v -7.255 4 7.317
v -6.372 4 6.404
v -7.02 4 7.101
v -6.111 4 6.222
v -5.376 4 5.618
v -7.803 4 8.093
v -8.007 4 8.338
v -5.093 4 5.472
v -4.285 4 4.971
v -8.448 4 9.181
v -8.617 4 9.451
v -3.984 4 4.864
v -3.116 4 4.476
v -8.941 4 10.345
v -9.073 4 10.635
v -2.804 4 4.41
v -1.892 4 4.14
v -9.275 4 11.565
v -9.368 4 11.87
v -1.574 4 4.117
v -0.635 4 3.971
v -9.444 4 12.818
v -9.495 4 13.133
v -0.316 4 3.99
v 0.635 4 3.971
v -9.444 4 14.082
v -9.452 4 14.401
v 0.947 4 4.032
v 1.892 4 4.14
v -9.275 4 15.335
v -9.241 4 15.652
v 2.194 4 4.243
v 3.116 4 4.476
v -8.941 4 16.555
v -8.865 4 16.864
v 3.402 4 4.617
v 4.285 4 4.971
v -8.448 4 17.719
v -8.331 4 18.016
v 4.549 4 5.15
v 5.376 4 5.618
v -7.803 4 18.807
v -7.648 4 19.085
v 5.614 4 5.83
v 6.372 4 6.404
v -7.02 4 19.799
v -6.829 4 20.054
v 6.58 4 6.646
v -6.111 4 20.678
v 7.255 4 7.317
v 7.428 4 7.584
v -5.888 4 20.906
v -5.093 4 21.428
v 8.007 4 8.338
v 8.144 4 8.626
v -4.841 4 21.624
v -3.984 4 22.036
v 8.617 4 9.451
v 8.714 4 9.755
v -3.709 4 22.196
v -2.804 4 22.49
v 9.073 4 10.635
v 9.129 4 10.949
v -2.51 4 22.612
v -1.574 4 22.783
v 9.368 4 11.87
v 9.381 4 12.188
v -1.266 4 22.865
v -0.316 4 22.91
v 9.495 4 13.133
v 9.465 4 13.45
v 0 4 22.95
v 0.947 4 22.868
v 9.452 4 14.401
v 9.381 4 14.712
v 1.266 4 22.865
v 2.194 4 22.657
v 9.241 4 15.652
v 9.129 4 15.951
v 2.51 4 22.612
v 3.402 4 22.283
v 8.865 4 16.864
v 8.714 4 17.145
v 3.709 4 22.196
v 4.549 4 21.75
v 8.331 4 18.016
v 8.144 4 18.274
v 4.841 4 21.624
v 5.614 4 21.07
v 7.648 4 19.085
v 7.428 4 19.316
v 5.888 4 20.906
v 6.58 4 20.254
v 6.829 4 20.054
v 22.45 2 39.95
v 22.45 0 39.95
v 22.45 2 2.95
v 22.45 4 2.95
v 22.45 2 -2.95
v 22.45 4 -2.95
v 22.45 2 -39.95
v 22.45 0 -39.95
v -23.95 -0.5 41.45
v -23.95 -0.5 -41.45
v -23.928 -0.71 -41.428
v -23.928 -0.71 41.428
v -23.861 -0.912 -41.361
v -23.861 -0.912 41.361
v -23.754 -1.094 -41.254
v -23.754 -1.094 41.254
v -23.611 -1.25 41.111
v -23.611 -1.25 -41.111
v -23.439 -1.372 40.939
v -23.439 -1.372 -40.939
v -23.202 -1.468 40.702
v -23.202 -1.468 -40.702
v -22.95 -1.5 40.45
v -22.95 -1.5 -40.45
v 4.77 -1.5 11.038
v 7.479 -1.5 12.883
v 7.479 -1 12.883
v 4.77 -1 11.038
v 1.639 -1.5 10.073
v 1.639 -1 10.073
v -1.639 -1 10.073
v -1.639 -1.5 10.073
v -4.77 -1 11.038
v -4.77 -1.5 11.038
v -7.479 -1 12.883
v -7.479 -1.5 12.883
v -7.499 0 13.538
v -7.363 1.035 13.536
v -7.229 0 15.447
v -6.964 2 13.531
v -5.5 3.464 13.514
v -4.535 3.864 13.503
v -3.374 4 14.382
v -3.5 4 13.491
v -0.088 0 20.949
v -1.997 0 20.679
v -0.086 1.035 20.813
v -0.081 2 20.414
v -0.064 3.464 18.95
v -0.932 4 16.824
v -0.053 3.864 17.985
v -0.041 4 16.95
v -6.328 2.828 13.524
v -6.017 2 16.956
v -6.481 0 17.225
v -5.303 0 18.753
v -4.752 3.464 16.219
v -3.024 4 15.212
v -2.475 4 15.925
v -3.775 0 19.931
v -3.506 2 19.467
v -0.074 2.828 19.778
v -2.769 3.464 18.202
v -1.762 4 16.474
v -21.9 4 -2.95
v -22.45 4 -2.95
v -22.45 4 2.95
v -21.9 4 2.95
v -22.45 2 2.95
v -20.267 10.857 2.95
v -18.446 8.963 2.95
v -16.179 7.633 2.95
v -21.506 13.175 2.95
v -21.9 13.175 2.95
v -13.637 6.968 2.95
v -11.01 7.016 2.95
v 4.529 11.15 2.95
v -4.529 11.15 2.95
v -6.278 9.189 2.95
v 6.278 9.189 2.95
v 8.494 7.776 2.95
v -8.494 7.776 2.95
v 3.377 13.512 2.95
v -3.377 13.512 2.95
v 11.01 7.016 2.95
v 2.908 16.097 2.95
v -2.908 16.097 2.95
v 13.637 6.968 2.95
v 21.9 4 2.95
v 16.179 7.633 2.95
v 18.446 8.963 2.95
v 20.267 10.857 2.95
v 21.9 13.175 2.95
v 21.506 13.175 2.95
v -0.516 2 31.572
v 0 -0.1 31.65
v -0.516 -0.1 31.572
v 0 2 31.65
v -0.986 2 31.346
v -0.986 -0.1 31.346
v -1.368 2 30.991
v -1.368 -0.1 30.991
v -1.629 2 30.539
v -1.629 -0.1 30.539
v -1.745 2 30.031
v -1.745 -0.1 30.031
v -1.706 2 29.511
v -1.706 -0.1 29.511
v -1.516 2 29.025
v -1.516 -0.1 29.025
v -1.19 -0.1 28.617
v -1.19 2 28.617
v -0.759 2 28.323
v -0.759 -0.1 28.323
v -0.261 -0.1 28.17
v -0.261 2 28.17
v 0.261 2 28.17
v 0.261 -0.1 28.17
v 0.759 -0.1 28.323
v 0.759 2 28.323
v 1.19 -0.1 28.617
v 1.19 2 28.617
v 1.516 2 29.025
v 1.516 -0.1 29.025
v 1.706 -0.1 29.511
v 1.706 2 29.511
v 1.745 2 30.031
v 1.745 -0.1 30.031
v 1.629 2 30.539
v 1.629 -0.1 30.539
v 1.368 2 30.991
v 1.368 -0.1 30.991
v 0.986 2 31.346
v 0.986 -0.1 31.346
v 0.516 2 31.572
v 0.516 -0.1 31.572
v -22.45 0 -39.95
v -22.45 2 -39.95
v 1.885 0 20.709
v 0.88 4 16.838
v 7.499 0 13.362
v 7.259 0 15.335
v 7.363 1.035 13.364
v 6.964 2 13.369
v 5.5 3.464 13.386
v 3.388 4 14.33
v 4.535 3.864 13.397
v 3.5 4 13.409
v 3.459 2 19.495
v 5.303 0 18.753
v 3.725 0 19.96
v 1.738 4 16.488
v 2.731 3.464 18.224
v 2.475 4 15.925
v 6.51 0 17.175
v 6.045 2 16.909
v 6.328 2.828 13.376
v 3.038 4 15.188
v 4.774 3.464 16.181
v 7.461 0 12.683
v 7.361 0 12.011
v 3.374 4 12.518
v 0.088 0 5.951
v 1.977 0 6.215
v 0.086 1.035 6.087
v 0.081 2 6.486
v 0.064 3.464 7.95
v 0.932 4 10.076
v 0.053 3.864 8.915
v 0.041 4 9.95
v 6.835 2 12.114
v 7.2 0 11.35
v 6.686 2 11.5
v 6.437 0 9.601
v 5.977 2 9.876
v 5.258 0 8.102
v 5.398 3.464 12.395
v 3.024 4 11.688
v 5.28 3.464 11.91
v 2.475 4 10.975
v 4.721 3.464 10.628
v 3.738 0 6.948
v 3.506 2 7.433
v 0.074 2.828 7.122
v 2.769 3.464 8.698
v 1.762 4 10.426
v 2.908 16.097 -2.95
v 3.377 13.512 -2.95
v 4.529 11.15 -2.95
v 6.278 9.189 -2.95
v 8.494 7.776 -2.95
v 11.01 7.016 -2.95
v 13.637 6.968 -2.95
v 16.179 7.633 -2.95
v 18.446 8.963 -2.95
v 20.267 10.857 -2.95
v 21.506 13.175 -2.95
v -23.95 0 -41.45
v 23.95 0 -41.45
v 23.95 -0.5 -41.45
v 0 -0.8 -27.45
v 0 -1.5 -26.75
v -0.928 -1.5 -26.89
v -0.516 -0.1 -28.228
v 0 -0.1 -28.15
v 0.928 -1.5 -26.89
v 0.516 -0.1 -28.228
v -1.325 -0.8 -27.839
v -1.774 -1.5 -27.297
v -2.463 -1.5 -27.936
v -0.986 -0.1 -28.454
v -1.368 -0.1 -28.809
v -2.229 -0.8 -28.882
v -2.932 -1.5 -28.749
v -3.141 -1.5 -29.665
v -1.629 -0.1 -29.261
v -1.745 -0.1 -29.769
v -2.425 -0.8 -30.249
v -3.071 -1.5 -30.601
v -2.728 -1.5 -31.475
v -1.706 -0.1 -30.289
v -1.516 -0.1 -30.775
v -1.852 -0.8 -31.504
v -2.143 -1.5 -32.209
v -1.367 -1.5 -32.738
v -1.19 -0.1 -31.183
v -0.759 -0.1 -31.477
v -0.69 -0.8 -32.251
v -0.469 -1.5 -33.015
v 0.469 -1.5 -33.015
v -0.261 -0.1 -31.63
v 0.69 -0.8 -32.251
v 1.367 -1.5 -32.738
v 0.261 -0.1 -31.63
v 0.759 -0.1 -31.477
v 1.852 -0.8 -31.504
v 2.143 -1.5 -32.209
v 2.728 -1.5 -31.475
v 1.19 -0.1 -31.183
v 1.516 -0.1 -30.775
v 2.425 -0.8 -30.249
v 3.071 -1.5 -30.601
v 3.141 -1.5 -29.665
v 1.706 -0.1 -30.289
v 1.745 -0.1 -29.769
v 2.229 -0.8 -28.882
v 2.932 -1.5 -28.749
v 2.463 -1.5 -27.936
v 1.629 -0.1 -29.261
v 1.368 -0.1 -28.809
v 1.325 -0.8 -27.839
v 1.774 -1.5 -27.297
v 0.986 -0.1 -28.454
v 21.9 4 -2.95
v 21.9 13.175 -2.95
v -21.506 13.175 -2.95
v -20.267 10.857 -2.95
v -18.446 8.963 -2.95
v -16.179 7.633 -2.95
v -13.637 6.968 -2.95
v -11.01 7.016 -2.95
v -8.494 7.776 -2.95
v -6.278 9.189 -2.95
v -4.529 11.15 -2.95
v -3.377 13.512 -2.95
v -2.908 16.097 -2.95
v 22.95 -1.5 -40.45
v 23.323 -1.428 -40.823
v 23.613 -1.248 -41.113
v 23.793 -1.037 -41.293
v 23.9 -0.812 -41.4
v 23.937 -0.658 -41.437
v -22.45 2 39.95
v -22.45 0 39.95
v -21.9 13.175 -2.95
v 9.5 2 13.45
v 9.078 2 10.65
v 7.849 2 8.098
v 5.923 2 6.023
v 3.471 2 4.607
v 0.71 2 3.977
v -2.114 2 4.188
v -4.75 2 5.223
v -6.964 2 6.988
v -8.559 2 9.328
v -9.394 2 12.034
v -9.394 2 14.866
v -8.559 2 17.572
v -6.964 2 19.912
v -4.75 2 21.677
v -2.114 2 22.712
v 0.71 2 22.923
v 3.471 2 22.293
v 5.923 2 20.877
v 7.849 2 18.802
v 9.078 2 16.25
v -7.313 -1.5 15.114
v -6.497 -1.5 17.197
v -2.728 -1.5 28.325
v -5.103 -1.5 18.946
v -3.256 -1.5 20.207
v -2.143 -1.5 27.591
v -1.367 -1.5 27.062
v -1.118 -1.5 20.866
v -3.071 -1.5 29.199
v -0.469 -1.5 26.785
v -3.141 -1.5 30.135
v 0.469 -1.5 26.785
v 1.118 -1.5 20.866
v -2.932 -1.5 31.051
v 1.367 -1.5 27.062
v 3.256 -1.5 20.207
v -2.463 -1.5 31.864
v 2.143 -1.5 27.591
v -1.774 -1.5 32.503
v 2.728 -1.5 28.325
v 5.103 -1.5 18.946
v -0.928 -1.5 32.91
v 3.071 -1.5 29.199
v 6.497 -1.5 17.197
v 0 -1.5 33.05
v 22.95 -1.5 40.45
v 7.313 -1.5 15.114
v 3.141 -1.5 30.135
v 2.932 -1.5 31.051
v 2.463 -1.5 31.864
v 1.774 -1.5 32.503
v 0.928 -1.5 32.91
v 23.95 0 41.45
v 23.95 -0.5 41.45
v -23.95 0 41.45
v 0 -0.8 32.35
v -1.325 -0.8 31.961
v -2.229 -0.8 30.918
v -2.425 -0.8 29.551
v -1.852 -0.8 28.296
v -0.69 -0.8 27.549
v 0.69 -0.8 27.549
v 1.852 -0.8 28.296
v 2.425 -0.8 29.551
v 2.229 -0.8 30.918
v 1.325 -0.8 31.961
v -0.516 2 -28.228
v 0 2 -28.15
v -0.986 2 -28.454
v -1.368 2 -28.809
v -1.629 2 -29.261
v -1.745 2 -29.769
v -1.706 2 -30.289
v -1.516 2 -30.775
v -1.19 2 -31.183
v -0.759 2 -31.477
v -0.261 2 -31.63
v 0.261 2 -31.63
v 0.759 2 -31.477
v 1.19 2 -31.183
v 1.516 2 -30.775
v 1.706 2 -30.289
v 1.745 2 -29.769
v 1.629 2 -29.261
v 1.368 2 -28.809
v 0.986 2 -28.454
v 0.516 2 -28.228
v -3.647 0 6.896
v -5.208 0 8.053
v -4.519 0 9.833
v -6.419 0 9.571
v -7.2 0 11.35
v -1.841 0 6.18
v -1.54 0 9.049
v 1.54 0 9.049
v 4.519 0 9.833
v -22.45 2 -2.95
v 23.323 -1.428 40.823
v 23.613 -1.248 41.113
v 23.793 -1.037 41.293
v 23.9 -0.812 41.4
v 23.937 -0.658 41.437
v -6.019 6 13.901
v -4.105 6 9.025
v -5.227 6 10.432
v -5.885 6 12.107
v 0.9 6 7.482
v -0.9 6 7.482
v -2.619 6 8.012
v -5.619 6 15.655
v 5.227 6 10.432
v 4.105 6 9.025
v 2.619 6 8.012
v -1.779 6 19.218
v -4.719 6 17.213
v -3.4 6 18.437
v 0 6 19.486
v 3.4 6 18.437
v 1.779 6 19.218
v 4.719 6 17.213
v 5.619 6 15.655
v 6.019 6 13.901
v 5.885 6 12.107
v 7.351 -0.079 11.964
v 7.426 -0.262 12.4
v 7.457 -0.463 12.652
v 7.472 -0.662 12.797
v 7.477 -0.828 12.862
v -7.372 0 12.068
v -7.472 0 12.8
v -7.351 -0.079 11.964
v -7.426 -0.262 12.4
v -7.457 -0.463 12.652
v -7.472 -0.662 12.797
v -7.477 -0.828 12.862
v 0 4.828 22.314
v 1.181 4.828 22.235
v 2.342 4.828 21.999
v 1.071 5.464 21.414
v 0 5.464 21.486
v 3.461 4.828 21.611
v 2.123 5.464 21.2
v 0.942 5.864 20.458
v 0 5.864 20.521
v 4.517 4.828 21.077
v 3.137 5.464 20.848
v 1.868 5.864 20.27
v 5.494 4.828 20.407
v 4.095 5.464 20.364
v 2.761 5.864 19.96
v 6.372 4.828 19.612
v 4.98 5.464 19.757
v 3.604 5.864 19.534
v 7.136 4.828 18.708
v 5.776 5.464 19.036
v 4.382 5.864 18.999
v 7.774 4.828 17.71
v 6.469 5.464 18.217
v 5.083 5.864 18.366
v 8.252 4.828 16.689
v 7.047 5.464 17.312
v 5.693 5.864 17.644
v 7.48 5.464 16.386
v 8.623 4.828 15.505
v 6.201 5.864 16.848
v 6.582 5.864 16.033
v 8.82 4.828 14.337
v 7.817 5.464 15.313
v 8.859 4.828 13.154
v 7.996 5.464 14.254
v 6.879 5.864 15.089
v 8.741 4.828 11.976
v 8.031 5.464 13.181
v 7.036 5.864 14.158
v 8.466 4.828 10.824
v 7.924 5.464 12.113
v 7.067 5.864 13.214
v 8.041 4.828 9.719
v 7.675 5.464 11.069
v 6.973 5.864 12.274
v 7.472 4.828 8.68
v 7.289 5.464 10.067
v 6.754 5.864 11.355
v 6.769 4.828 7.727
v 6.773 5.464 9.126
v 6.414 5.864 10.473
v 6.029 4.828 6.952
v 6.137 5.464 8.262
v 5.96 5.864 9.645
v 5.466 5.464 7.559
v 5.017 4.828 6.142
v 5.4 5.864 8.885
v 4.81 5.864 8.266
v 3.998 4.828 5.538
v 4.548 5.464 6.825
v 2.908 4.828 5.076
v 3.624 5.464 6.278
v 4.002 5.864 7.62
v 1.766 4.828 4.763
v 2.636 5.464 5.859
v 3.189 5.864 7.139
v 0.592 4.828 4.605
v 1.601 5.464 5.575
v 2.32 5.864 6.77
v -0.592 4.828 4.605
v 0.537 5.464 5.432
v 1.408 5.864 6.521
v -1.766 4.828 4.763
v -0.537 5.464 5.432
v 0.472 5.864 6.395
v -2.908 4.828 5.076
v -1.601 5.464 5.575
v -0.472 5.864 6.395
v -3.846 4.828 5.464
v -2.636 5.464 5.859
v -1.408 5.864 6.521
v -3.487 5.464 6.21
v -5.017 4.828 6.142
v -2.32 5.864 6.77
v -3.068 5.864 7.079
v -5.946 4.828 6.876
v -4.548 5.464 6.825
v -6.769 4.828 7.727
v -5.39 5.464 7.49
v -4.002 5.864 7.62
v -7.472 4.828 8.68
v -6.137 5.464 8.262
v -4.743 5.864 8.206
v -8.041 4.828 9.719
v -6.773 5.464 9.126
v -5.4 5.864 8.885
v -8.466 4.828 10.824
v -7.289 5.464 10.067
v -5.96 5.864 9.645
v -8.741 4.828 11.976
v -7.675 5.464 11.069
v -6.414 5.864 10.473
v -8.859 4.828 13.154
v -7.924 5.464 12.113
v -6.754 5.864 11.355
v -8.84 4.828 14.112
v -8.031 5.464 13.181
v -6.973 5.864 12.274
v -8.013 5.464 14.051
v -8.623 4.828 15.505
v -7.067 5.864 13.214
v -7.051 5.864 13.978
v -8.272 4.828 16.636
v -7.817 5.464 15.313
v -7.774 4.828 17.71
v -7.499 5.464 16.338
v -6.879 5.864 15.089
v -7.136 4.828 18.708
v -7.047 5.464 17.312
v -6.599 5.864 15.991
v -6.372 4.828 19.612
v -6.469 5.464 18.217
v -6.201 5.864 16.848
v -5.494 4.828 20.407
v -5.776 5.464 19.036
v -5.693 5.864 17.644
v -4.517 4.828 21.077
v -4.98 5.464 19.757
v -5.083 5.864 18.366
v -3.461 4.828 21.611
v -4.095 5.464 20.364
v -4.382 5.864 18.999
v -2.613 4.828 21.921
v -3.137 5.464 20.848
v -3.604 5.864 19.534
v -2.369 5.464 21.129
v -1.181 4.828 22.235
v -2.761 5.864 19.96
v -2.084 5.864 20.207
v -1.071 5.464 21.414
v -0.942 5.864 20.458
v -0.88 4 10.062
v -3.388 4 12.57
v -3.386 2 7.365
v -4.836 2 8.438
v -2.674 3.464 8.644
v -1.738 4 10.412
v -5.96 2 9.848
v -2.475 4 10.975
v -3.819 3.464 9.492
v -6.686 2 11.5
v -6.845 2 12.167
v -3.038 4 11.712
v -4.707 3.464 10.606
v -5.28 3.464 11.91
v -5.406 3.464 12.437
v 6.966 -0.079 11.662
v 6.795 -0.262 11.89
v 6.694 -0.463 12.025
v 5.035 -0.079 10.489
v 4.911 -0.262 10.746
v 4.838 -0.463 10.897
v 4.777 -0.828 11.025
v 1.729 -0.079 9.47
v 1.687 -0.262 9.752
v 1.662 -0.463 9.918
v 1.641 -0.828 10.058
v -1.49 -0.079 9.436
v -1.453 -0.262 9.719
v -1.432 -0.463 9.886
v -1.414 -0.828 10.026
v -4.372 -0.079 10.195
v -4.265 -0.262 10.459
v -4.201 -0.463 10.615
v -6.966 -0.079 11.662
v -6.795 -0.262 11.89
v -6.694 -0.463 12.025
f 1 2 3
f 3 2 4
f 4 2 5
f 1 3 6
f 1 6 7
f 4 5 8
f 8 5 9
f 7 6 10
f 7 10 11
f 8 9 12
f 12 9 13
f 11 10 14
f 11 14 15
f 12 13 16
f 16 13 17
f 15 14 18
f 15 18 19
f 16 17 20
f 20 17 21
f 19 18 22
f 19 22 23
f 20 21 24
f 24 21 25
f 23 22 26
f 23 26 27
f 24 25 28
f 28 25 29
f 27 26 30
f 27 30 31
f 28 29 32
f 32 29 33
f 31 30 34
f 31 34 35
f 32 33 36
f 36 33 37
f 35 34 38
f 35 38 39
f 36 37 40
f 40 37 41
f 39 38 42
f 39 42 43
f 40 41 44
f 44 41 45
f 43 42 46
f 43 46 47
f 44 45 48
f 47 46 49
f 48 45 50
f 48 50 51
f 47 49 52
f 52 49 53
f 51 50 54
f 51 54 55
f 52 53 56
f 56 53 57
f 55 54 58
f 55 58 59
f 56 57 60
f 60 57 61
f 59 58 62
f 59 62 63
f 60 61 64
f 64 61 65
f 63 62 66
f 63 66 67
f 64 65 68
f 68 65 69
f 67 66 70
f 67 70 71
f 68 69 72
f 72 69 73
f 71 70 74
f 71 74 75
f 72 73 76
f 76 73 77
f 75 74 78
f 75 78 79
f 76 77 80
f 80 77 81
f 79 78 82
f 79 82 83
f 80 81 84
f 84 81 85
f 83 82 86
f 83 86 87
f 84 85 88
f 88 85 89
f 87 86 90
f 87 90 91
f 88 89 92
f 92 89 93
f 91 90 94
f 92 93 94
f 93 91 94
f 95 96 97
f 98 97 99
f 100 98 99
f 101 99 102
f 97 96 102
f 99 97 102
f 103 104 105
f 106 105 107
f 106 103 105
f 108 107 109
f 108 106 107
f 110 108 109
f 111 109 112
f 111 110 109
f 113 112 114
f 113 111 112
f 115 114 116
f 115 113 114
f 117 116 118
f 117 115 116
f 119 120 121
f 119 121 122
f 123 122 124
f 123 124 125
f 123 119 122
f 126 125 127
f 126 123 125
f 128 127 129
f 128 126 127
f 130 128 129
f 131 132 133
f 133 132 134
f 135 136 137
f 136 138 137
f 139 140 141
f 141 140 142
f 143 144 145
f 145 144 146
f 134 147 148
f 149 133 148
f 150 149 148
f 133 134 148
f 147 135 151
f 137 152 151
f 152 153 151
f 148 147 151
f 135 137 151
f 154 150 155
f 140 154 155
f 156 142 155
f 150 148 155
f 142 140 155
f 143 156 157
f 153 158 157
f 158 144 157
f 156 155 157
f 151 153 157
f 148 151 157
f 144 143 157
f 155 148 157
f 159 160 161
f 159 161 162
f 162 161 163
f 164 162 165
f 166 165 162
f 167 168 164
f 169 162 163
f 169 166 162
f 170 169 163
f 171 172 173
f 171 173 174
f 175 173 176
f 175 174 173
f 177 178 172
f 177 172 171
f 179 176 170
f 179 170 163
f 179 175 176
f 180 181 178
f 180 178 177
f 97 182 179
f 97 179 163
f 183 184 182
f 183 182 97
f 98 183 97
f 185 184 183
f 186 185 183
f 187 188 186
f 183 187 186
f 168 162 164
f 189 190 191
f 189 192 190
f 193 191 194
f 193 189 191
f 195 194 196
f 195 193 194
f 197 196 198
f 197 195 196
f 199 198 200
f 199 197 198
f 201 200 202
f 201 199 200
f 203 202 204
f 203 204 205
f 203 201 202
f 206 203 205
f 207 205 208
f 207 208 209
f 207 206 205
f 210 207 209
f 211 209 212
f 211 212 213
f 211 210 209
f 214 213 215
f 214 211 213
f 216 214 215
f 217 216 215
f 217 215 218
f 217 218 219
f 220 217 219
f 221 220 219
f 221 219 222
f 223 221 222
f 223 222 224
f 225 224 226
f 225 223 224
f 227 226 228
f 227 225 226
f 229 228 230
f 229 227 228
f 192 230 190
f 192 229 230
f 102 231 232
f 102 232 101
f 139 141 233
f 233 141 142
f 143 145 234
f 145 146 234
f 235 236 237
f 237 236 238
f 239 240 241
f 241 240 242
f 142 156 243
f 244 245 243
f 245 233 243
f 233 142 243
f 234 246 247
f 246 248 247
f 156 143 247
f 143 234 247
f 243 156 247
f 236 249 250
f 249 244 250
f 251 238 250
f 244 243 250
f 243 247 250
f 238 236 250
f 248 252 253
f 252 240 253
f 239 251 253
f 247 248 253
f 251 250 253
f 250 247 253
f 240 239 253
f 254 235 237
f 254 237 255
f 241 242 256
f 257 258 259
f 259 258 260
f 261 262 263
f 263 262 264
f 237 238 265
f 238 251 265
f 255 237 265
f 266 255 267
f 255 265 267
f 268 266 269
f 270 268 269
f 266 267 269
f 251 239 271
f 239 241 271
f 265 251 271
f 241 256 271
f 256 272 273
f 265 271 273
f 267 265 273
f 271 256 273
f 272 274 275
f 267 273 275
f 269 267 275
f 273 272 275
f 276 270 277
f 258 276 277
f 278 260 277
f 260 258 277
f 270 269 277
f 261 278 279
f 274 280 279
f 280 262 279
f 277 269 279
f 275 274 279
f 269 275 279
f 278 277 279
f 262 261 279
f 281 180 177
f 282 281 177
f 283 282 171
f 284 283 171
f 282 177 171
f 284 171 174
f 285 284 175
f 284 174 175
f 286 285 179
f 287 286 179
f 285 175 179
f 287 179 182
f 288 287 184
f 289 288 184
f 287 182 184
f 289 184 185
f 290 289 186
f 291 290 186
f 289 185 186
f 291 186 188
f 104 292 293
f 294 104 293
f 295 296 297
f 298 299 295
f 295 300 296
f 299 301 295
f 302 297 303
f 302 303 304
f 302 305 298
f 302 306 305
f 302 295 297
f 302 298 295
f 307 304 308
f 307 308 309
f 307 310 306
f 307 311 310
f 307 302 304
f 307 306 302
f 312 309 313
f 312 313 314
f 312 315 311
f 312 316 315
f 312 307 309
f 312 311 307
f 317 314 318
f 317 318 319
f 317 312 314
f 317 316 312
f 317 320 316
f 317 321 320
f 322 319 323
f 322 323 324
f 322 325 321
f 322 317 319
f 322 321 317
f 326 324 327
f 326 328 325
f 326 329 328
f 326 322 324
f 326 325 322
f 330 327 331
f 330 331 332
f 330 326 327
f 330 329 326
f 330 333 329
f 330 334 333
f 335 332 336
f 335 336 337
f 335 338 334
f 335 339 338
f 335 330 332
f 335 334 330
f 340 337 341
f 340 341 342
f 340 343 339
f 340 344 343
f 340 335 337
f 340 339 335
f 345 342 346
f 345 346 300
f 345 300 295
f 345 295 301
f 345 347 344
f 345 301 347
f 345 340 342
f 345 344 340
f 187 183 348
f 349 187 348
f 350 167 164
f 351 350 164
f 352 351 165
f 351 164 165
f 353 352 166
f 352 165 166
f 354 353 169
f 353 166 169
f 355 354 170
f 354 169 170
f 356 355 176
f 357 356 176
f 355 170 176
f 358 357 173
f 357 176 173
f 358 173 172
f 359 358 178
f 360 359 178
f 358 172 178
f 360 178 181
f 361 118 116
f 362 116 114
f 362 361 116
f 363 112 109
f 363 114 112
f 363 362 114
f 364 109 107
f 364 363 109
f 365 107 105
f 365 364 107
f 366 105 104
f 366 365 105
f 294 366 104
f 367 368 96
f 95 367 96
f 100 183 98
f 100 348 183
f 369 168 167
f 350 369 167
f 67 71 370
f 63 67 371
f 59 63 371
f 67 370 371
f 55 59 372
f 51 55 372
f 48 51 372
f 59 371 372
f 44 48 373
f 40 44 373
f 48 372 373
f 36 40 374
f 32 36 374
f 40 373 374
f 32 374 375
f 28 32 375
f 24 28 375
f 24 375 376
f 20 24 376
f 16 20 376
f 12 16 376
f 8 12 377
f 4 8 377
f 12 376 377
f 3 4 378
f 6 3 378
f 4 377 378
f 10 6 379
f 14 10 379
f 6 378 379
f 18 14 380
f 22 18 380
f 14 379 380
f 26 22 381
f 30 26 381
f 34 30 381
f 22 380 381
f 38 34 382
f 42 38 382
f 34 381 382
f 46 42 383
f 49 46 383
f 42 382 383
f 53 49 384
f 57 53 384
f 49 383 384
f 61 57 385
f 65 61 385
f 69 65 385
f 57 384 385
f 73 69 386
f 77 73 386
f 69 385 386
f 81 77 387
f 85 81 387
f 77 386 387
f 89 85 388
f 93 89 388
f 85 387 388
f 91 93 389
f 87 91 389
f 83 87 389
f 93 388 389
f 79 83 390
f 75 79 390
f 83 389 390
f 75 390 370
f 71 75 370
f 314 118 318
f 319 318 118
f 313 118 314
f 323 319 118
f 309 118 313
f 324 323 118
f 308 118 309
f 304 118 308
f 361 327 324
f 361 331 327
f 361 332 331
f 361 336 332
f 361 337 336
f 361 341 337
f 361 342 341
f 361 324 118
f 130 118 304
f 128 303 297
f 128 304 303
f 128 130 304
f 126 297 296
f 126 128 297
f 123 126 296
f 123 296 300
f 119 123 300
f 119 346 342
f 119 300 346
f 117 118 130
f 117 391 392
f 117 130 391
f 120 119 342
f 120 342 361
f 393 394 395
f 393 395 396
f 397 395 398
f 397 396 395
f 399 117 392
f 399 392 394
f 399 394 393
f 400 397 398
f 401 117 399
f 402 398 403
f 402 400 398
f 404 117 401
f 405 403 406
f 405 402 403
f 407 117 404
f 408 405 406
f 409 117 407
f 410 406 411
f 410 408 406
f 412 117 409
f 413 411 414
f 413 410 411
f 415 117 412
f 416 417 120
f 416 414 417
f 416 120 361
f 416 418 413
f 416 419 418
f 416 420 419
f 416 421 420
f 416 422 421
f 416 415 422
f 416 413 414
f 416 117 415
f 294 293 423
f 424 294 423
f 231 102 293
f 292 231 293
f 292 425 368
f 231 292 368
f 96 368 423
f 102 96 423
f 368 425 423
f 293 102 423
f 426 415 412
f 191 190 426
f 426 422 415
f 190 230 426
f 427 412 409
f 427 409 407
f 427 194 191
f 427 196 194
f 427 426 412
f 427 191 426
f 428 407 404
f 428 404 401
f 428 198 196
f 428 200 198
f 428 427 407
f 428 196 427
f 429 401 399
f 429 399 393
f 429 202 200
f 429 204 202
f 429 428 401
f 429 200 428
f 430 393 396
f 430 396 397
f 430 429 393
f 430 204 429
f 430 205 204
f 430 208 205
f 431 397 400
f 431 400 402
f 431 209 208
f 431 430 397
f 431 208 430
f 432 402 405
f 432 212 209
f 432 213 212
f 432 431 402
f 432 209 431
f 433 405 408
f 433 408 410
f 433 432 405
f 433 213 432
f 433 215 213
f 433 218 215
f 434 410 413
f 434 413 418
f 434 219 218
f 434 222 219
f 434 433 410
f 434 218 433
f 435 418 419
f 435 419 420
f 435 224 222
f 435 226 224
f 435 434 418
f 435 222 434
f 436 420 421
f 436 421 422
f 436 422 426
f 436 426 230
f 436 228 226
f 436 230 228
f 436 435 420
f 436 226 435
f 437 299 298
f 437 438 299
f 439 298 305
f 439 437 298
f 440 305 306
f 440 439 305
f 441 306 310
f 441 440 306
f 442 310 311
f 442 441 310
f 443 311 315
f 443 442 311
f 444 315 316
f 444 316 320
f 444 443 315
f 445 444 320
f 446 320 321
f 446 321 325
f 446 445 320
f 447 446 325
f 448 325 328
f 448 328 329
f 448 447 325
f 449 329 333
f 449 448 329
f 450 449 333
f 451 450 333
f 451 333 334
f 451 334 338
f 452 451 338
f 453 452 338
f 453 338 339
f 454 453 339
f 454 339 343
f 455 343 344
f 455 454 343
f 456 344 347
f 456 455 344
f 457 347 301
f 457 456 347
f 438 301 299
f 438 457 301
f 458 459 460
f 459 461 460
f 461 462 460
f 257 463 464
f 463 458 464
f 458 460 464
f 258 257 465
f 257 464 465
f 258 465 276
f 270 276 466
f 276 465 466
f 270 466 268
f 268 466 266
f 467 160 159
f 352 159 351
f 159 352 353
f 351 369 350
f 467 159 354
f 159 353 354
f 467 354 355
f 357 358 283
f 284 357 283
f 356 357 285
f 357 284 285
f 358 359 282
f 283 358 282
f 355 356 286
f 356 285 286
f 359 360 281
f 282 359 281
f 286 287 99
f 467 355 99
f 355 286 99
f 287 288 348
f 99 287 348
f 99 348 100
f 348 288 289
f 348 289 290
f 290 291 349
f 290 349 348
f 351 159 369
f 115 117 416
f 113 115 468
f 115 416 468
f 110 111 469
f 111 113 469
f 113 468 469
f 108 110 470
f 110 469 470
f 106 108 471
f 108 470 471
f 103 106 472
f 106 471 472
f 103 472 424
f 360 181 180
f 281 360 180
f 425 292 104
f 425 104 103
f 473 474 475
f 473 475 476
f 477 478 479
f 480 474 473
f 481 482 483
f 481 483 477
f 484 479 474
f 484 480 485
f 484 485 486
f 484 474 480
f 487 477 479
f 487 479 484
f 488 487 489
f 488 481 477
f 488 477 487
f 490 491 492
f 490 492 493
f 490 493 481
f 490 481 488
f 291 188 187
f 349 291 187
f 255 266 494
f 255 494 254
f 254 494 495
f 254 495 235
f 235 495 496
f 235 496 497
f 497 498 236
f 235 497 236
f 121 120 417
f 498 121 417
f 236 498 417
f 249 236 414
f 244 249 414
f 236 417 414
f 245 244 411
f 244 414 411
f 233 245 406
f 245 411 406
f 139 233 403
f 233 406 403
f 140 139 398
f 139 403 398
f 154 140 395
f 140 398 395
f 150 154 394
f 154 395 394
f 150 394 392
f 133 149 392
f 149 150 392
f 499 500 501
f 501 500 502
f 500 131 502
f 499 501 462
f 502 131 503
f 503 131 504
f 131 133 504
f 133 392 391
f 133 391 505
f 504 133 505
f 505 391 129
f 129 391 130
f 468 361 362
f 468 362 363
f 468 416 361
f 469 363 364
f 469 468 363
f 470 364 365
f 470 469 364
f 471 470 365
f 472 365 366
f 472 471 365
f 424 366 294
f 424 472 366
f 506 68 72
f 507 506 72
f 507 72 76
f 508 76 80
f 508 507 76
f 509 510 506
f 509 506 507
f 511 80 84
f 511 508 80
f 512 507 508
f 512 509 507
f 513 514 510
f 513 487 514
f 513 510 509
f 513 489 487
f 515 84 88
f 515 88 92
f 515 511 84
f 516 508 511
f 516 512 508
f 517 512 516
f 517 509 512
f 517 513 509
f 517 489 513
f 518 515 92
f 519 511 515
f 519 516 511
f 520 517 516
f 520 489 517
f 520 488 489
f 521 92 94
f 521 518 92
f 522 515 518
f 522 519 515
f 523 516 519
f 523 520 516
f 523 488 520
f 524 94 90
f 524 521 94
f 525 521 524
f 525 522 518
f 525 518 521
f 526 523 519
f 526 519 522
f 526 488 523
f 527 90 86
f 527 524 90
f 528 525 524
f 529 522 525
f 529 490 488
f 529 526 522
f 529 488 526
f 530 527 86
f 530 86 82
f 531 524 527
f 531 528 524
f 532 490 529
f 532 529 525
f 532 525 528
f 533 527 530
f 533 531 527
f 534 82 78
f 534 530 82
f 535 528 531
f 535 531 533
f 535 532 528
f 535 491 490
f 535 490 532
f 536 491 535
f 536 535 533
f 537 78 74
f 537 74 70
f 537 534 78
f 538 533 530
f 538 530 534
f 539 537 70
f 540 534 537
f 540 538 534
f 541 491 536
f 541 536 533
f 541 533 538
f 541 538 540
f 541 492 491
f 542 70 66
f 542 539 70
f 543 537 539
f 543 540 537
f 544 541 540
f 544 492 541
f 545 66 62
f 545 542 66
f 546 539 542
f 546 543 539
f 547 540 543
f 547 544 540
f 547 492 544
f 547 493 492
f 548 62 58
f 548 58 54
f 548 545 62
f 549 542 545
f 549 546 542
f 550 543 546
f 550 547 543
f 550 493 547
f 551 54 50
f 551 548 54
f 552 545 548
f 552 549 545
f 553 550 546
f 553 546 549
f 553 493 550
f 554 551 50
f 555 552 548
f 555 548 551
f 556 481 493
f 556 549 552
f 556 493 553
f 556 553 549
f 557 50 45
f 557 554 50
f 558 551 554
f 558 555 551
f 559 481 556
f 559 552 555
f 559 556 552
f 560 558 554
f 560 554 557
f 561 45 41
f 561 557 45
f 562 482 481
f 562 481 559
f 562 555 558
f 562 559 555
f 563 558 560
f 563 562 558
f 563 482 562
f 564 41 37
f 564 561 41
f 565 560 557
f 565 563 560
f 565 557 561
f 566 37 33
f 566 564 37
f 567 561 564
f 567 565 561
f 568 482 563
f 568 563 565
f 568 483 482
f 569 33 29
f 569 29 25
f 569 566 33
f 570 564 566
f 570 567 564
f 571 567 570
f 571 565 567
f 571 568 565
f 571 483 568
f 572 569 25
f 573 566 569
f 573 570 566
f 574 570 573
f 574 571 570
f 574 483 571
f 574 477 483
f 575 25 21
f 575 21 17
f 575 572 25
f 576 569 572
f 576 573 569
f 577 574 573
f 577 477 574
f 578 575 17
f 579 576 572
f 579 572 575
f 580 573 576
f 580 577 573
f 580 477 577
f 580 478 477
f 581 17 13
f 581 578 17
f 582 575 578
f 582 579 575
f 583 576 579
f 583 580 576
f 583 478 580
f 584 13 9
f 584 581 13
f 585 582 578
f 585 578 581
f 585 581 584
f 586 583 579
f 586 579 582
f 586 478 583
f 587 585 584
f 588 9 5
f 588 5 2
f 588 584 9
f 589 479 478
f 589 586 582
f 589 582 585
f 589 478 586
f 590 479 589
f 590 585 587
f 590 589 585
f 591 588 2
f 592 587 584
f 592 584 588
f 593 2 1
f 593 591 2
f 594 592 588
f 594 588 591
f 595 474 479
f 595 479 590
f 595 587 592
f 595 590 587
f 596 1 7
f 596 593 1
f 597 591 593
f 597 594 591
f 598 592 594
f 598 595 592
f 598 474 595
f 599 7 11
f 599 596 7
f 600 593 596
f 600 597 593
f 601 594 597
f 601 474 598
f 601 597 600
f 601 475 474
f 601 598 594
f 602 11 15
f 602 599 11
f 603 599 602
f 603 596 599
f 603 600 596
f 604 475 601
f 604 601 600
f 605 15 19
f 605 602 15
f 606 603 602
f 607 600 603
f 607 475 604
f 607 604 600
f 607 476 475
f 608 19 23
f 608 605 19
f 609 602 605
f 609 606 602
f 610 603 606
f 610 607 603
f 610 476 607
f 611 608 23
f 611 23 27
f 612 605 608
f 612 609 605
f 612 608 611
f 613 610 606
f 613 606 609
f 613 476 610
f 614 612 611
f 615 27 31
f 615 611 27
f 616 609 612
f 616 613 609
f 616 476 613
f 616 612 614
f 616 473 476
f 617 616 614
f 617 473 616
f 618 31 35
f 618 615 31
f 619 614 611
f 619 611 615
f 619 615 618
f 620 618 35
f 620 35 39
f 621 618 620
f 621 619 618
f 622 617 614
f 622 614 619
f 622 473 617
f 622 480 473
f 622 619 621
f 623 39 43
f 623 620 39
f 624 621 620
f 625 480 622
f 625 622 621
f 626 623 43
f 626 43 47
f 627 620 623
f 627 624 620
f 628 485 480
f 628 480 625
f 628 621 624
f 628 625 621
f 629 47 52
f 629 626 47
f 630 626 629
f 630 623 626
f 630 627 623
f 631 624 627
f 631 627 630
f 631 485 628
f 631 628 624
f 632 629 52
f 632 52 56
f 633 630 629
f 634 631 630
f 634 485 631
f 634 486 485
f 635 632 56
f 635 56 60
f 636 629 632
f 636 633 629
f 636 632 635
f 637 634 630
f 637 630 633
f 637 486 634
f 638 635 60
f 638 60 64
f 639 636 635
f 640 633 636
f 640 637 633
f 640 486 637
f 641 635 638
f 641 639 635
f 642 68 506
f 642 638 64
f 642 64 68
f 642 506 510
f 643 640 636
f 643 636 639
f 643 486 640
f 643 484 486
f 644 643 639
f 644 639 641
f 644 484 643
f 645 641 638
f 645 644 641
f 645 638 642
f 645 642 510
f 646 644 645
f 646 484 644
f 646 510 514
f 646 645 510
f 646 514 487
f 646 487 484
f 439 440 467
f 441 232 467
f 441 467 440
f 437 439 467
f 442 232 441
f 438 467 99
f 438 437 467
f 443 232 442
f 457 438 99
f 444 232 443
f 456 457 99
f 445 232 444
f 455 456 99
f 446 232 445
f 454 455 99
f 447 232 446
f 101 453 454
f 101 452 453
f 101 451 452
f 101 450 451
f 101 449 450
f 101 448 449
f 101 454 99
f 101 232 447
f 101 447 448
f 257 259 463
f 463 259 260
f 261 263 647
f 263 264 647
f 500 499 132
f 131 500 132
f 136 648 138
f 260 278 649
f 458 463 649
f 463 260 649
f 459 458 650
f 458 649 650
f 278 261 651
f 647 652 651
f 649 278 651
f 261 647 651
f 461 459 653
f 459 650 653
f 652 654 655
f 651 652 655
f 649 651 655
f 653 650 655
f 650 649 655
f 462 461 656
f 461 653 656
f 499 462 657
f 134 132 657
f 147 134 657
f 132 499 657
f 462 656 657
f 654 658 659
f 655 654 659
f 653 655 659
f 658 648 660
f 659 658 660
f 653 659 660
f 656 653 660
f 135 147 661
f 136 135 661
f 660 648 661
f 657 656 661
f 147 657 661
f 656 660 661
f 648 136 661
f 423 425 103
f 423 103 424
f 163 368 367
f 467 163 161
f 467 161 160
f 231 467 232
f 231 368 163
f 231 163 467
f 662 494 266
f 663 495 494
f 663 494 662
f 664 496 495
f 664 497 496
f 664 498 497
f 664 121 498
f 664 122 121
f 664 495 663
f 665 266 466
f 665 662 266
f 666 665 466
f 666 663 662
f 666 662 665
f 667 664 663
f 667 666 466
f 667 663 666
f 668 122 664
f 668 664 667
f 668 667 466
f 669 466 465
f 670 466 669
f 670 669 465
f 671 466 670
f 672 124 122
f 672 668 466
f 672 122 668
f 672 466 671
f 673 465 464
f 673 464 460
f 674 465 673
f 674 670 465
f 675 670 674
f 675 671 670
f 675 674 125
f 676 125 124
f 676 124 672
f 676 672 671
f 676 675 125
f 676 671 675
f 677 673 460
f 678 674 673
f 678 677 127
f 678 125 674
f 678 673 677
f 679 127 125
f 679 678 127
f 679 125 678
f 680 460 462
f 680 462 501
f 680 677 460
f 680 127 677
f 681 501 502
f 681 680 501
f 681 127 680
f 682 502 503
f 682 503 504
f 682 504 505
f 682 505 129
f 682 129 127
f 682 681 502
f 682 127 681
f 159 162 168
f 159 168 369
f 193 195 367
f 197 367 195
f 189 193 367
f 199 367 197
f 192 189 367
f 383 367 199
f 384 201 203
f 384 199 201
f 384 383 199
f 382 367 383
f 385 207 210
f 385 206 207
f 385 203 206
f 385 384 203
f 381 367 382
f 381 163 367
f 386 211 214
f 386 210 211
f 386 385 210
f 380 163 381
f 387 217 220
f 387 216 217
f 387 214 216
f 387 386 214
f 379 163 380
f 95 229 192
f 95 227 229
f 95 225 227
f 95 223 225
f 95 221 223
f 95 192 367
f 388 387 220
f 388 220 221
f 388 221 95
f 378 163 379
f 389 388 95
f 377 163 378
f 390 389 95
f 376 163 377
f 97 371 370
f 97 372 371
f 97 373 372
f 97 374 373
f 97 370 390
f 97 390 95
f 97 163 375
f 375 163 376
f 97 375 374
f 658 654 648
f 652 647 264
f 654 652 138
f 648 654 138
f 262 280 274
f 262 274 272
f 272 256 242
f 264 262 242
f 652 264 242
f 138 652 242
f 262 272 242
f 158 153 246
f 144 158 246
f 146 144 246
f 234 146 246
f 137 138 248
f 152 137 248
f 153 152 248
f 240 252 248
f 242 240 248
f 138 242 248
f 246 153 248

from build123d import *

# Parameters (mm, degrees)
SKETCH_1_W          = 44.9
SKETCH_1_H          = 79.9
EXTRUDE_1_DEPTH     = 4
SKETCH_2_W          = 43.8
SKETCH_2_H          = 5.9
EXTRUDE_2_DEPTH     = 12.5
CUT_EXTRUDE_6_DEPTH = 52.15332345
SKETCH_7_R          = 1.75
CUT_EXTRUDE_7_DEPTH = 48.395642792
SKETCH_8_W          = 47.9
SKETCH_8_H          = 82.9
SKETCH_8_R          = 1.75
EXTRUDE_3_DEPTH     = 1.5
FILLET_1_R          = 1
SKETCH_9_R          = 7.5
CUT_EXTRUDE_8_DEPTH = 52.003588333
CHAMFER_1_SIZE      = 1.4
SKETCH_10_W         = 47.9
SKETCH_10_H         = 38.5
CUT_EXTRUDE_9_DEPTH = 2
SKETCH_11_R         = 9.5
SKETCH_11_R_2       = 7.5
EXTRUDE_1_2_DEPTH   = 2
EXTRUDE_1_2_DRAFT   = 1
SKETCH_12_R         = 9.5
EXTRUDE_4_DEPTH     = 2
FILLET_2_R          = 4
EXTRUDE_5_DEPTH     = 1.5
FILLET_3_R          = 1


with BuildPart() as part:
    # Эскиз1 → Extrude 1 (new body)
    with BuildSketch(Plane(origin=(0, 0, 0), x_dir=(1, 0, 0), z_dir=(0, 1, 0))):
        Rectangle(SKETCH_1_W, SKETCH_1_H)
    extrude(amount=EXTRUDE_1_DEPTH)

    # Эскиз2 → Бобышка-Вытянуть2 (add)
    with BuildSketch(Plane(origin=(0, 4, 0), x_dir=(1, 0, 0), z_dir=(0, 1, 0))):
        Rectangle(SKETCH_2_W, SKETCH_2_H)
    extrude(amount=EXTRUDE_2_DEPTH)

    # Эскиз3 → Вырез-Вытянуть6 (cut, through all)
    with BuildSketch(Plane.XY.offset(2.95)):
        with BuildLine():
            Line((-2.908454638, 16.097187923), (2.908454638, 16.097187923))
            ThreePointArc((2.908454638, 16.097187923), (11.009669484, 7.016387031), (21.505675783, 13.174672393))
            Line((21.505675783, 13.174672393), (23.649512702, 13.174672393))
            Line((23.649512702, 13.174672393), (22.1, 16.5))
            ThreePointArc((22.1, 16.5), (19.288225099, 23.288225099), (12.5, 26.1))
            Line((12.5, 26.1), (-12.5, 26.1))
            ThreePointArc((-12.5, 26.1), (-19.288225099, 23.288225099), (-22.1, 16.5))
            Line((-22.1, 16.5), (-23.550546649, 13.174672393))
            Line((-23.550546649, 13.174672393), (-21.505675783, 13.174672393))
            ThreePointArc((-21.505675783, 13.174672393), (-11.009669484, 7.016387031), (-2.908454638, 16.097187923))
        make_face()
    extrude(amount=-CUT_EXTRUDE_6_DEPTH, mode=Mode.SUBTRACT)

    # Эскиз7 → Вырез-Вытянуть7 (cut, through all)
    with BuildSketch(Plane(origin=(0, 4, 0), x_dir=(1, 0, 0), z_dir=(0, 1, 0))):
        with Locations(Location((0, -29.9, 0), (0, 0, 270))):
            Circle(SKETCH_7_R)
        with Locations(Location((0, 29.9, 0), (0, 0, 270))):
            Circle(SKETCH_7_R)
    extrude(amount=-CUT_EXTRUDE_7_DEPTH, mode=Mode.SUBTRACT)

    # Эскиз8 → Бобышка-Вытянуть3 (add)
    with BuildSketch(Plane.XZ):
        Rectangle(SKETCH_8_W, SKETCH_8_H)
        with Locations(Location((0, 29.9, 0), (0, 0, 90))):
            Circle(SKETCH_8_R, mode=Mode.SUBTRACT)
        with Locations(Location((0, -29.9, 0), (0, 0, 90))):
            Circle(SKETCH_8_R, mode=Mode.SUBTRACT)
    extrude(amount=EXTRUDE_3_DEPTH)

    # Скругление1
    fillet_1_edges = [part.edges().sort_by_distance(p)[0] for p in [
        (-23.95, -1.5, 0),
        (0, -1.5, -41.45),
        (23.95, -1.5, 0),
        (0, -1.5, 41.45),
    ]]
    fillet(fillet_1_edges, radius=FILLET_1_R)

    # Эскиз9 → Вырез-Вытянуть8 (cut, through all)
    with BuildSketch(Plane.XZ.offset(1.5)):
        with Locations(Location((0, 13.45, 0), (0, 0, 270))):
            Circle(SKETCH_9_R)
    extrude(amount=-CUT_EXTRUDE_8_DEPTH, mode=Mode.SUBTRACT)

    # Фаска1
    chamfer_1_edges = [part.edges().sort_by_distance(p)[0] for p in [
        (0, -1.5, 28.15),
        (0, -1.5, -31.65),
    ]]
    chamfer(chamfer_1_edges, length=CHAMFER_1_SIZE)

    # Эскиз10 → Вырез-Вытянуть9 (cut)
    with BuildSketch(Plane(origin=(0, 4, 0), x_dir=(1, 0, 0), z_dir=(0, 1, 0))):
        with Locations((0, 22.2)):
            Rectangle(SKETCH_10_W, SKETCH_10_H)
        with Locations((0, -22.2)):
            Rectangle(SKETCH_10_W, SKETCH_10_H)
    extrude(amount=-CUT_EXTRUDE_9_DEPTH, mode=Mode.SUBTRACT)


with BuildPart() as extrude_1_2_tool:
    # Эскиз11 → Extrude 1 2 (with draft: the straight prism first)
    with BuildSketch(Plane(origin=(0, 2, 0), x_dir=(1, 0, 0), z_dir=(0, 1, 0))):
        with Locations((0, -13.45)):
            Circle(SKETCH_11_R)
        with Locations((0, -13.45)):
            Circle(SKETCH_11_R_2, mode=Mode.SUBTRACT)
    extrude(amount=EXTRUDE_1_2_DEPTH)
    # Extrude 1 2: the draft: its side faces are tilted about the plane it starts from
    extrude_1_2_sides = [extrude_1_2_tool.faces().sort_by_distance(p)[0] for p in [
        (-9.5, 3, 13.45),
        (-7.5, 3, 13.45),
    ]]
    draft(extrude_1_2_sides, Plane(origin=(0, 2, 0), x_dir=(1, 0, 0), z_dir=(0, 1, 0)), EXTRUDE_1_2_DRAFT)


with BuildPart() as part_1:
    add(part.part)

    # Extrude 1 2: add extrude_1_2_tool
    add(extrude_1_2_tool.part)

    # Эскиз12 → Бобышка-Вытянуть4 (add)
    with BuildSketch(Plane(origin=(0, 4, 0), x_dir=(1, 0, 0), z_dir=(0, 1, 0))):
        with Locations(Location((0, -13.45, 0), (0, 0, 270))):
            Circle(SKETCH_12_R)
    extrude(amount=EXTRUDE_4_DEPTH)

    # Скругление2
    # the kernel refuses this fillet: 4 mm, written as the material it takes off along each edge
    with BuildSketch(Plane(origin=(0, 6, 13.45), x_dir=(0, 0, 1), z_dir=(-1, 0, 0))) as fillet_2_piece_1:
        with BuildLine():
            CenterArc((6.035898385, -4), FILLET_2_R, 30, 60)
            Line((6.035898385, 0), (6.035898385, 0.08))
            Line((6.035898385, 0.08), (9.5, 0.08))
            Line((9.5, 0.08), (9.58, 0))
            ThreePointArc((9.58, 0), (9.58, -1), (9.569282032, -1.96))
            Line((9.569282032, -1.96), (9.5, -2))
        make_face()
    revolve(axis=Axis((0, 6, 13.45), (0, 1, 0)), mode=Mode.SUBTRACT)
    # the kernel refuses this fillet: 4 mm, written as the material it takes off along each edge
    with BuildSketch(Plane(origin=(0, 2, 13.45), x_dir=(0.9999318130918542, 0, -0.011677720960747706), z_dir=(-0.011677720960747706, 0, -0.9999318130918542))) as fillet_2_2_piece_1:
        with BuildLine():
            CenterArc((7.5 + FILLET_2_R, FILLET_2_R * 0.00872686779076), FILLET_2_R, 180, 1)
            Line((7.5 + FILLET_2_R * 0.000152304843608, -FILLET_2_R * 0.00872553864652), (7.5 - FILLET_2_R * 0.0198446490595, -FILLET_2_R * 0.00907458677527))
            Line((7.5 - FILLET_2_R * 0.0198446490595, -FILLET_2_R * 0.00907458677527), (7.5 - FILLET_2_R * 0.02, -FILLET_2_R * 0.000174537355815))
            Line((7.5 - FILLET_2_R * 0.02, -FILLET_2_R * 0.000174537355815), (7.5 - FILLET_2_R * 0.02, FILLET_2_R * 0.00872686779076))
            Line((7.5 - FILLET_2_R * 0.02, FILLET_2_R * 0.00872686779076), (7.5, FILLET_2_R * 0.00872686779076))
        make_face()
    revolve(axis=Axis((0, 2, 13.45), (0, -1, 0)), revolution_arc=271.338198667, mode=Mode.SUBTRACT)
    # the kernel refuses this fillet: 4 mm, written as the material it adds along each edge
    with BuildSketch(Plane(origin=(0, 4, 13.45), x_dir=(1, 0, 0), z_dir=(0, 0, 1))) as fillet_2_3_piece_1_section:
        with BuildLine():
            CenterArc((3.5, -4), FILLET_2_R, 0, 90)
            Line((3.5, 0), (3.5, 0.4))
            Line((3.5, 0.4), (7.53491013, 0.4))
            Line((7.53491013, 0.4), (7.934849208, -0.006980963))
            ThreePointArc((7.934849208, -0.006980963), (7.9, -2.034907471), (7.9, -4))
            Line((7.9, -4), (7.5, -4))
        make_face()
    fillet_2_3_piece_1 = revolve(axis=Axis((0, 4, 13.45), (0, 1, 0)), mode=Mode.PRIVATE)
    fillet_2_3_piece_1 = split(fillet_2_3_piece_1, bisect_by=Plane(origin=(0, 4, 13.45), z_dir=(0.011677720960747706, 0, 0.9999318130918542)), keep=Keep.TOP, mode=Mode.PRIVATE)
    fillet_2_3_piece_1 = split(fillet_2_3_piece_1, bisect_by=Plane(origin=(0, 4, 13.45), z_dir=(0.9999318130918542, 0, 0.011677720960747469)), keep=Keep.TOP, mode=Mode.PRIVATE)
    add(fillet_2_3_piece_1)
    with BuildSketch(Plane(origin=(0, 4, 13.45), x_dir=(1, 0, 0), z_dir=(0, 0, 1))) as fillet_2_3_piece_2_section:
        with BuildLine():
            CenterArc((3.5, -4), FILLET_2_R, 0, 90)
            Line((3.5, 0), (3.5, 0.4))
            Line((3.5, 0.4), (7.53491013, 0.4))
            Line((7.53491013, 0.4), (7.934849208, -0.006980963))
            ThreePointArc((7.934849208, -0.006980963), (7.9, -2.034907471), (7.9, -4))
            Line((7.9, -4), (7.5, -4))
        make_face()
    fillet_2_3_piece_2 = revolve(axis=Axis((0, 4, 13.45), (0, 1, 0)), mode=Mode.PRIVATE)
    fillet_2_3_piece_2 = split(fillet_2_3_piece_2, bisect_by=Plane(origin=(0, 4, 13.45), z_dir=(-0.011677720960747706, 0, -0.9999318130918542)), keep=Keep.TOP, mode=Mode.PRIVATE)
    fillet_2_3_piece_2 = split(fillet_2_3_piece_2, bisect_by=Plane(origin=(0, 4, 13.45), z_dir=(0.9999318130918542, 0, 0.011677720960747469)), keep=Keep.TOP, mode=Mode.PRIVATE)
    add(fillet_2_3_piece_2)
    with BuildSketch(Plane(origin=(0, 4, 13.45), x_dir=(1, 0, 0), z_dir=(0, 0, 1))) as fillet_2_3_piece_3_section:
        with BuildLine():
            CenterArc((3.5, -4), FILLET_2_R, 0, 90)
            Line((3.5, 0), (3.5, 0.4))
            Line((3.5, 0.4), (7.53491013, 0.4))
            Line((7.53491013, 0.4), (7.934849208, -0.006980963))
            ThreePointArc((7.934849208, -0.006980963), (7.9, -2.034907471), (7.9, -4))
            Line((7.9, -4), (7.5, -4))
        make_face()
    fillet_2_3_piece_3 = revolve(axis=Axis((0, 4, 13.45), (0, 1, 0)), mode=Mode.PRIVATE)
    fillet_2_3_piece_3 = split(fillet_2_3_piece_3, bisect_by=Plane(origin=(0, 4, 13.45), z_dir=(0.011677720960747706, 0, 0.9999318130918542)), keep=Keep.TOP, mode=Mode.PRIVATE)
    fillet_2_3_piece_3 = split(fillet_2_3_piece_3, bisect_by=Plane(origin=(0, 4, 13.45), z_dir=(-0.9999318130918542, 0, -0.011677720960747469)), keep=Keep.TOP, mode=Mode.PRIVATE)
    add(fillet_2_3_piece_3)
    with BuildSketch(Plane(origin=(0, 4, 13.45), x_dir=(1, 0, 0), z_dir=(0, 0, 1))) as fillet_2_3_piece_4_section:
        with BuildLine():
            CenterArc((3.5, -4), FILLET_2_R, 0, 90)
            Line((3.5, 0), (3.5, 0.4))
            Line((3.5, 0.4), (7.53491013, 0.4))
            Line((7.53491013, 0.4), (7.934849208, -0.006980963))
            ThreePointArc((7.934849208, -0.006980963), (7.9, -2.034907471), (7.9, -4))
            Line((7.9, -4), (7.5, -4))
        make_face()
    fillet_2_3_piece_4 = revolve(axis=Axis((0, 4, 13.45), (0, 1, 0)), mode=Mode.PRIVATE)
    fillet_2_3_piece_4 = split(fillet_2_3_piece_4, bisect_by=Plane(origin=(0, 4, 13.45), z_dir=(-0.011677720960747706, 0, -0.9999318130918542)), keep=Keep.TOP, mode=Mode.PRIVATE)
    fillet_2_3_piece_4 = split(fillet_2_3_piece_4, bisect_by=Plane(origin=(0, 4, 13.45), z_dir=(-0.9999318130918542, 0, -0.011677720960747469)), keep=Keep.TOP, mode=Mode.PRIVATE)
    add(fillet_2_3_piece_4)

    # Эскиз13 → Бобышка-Вытянуть5 (add)
    with BuildSketch(Plane.XZ.offset(1.5)):
        with BuildLine():
            Line((-11, 20.95), (-11, 3.952706076))
            Line((-11, 3.952706076), (11, 3.952706076))
            Line((11, 3.952706076), (11, 20.95))
            ThreePointArc((11, 20.95), (0, 9.95), (-11, 20.95))
        make_face()
    extrude(amount=-EXTRUDE_5_DEPTH)

    # Скругление3
    # the kernel refuses this fillet: 1 mm, written as the material it takes off along each edge
    with BuildSketch(Plane(origin=(0, 0, 20.95), x_dir=(0.827668100134072, 0, -0.5612178864046082), z_dir=(0.5612178864046082, 0, 0.827668100134072))) as fillet_3_piece_1_section:
        with BuildLine():
            CenterArc((11 + FILLET_3_R, -FILLET_3_R), FILLET_3_R, 90, 90)
            Line((11 + FILLET_3_R, 0), (11, 0))
            Line((11, 0), (11, -FILLET_3_R))
        make_face()
    fillet_3_piece_1 = revolve(axis=Axis((0, 0, 20.95), (0, 1, 0)), revolution_arc=111.719870778, mode=Mode.PRIVATE)
    fillet_3_piece_1 = fillet_3_piece_1 & Plane(origin=(0, 0, 13.45), x_dir=(0, 0, -1), z_dir=(0, -1, 0)) * Cylinder(7.5, 49, mode=Mode.PRIVATE)
    add(fillet_3_piece_1, mode=Mode.SUBTRACT)


solid = part_1.part
